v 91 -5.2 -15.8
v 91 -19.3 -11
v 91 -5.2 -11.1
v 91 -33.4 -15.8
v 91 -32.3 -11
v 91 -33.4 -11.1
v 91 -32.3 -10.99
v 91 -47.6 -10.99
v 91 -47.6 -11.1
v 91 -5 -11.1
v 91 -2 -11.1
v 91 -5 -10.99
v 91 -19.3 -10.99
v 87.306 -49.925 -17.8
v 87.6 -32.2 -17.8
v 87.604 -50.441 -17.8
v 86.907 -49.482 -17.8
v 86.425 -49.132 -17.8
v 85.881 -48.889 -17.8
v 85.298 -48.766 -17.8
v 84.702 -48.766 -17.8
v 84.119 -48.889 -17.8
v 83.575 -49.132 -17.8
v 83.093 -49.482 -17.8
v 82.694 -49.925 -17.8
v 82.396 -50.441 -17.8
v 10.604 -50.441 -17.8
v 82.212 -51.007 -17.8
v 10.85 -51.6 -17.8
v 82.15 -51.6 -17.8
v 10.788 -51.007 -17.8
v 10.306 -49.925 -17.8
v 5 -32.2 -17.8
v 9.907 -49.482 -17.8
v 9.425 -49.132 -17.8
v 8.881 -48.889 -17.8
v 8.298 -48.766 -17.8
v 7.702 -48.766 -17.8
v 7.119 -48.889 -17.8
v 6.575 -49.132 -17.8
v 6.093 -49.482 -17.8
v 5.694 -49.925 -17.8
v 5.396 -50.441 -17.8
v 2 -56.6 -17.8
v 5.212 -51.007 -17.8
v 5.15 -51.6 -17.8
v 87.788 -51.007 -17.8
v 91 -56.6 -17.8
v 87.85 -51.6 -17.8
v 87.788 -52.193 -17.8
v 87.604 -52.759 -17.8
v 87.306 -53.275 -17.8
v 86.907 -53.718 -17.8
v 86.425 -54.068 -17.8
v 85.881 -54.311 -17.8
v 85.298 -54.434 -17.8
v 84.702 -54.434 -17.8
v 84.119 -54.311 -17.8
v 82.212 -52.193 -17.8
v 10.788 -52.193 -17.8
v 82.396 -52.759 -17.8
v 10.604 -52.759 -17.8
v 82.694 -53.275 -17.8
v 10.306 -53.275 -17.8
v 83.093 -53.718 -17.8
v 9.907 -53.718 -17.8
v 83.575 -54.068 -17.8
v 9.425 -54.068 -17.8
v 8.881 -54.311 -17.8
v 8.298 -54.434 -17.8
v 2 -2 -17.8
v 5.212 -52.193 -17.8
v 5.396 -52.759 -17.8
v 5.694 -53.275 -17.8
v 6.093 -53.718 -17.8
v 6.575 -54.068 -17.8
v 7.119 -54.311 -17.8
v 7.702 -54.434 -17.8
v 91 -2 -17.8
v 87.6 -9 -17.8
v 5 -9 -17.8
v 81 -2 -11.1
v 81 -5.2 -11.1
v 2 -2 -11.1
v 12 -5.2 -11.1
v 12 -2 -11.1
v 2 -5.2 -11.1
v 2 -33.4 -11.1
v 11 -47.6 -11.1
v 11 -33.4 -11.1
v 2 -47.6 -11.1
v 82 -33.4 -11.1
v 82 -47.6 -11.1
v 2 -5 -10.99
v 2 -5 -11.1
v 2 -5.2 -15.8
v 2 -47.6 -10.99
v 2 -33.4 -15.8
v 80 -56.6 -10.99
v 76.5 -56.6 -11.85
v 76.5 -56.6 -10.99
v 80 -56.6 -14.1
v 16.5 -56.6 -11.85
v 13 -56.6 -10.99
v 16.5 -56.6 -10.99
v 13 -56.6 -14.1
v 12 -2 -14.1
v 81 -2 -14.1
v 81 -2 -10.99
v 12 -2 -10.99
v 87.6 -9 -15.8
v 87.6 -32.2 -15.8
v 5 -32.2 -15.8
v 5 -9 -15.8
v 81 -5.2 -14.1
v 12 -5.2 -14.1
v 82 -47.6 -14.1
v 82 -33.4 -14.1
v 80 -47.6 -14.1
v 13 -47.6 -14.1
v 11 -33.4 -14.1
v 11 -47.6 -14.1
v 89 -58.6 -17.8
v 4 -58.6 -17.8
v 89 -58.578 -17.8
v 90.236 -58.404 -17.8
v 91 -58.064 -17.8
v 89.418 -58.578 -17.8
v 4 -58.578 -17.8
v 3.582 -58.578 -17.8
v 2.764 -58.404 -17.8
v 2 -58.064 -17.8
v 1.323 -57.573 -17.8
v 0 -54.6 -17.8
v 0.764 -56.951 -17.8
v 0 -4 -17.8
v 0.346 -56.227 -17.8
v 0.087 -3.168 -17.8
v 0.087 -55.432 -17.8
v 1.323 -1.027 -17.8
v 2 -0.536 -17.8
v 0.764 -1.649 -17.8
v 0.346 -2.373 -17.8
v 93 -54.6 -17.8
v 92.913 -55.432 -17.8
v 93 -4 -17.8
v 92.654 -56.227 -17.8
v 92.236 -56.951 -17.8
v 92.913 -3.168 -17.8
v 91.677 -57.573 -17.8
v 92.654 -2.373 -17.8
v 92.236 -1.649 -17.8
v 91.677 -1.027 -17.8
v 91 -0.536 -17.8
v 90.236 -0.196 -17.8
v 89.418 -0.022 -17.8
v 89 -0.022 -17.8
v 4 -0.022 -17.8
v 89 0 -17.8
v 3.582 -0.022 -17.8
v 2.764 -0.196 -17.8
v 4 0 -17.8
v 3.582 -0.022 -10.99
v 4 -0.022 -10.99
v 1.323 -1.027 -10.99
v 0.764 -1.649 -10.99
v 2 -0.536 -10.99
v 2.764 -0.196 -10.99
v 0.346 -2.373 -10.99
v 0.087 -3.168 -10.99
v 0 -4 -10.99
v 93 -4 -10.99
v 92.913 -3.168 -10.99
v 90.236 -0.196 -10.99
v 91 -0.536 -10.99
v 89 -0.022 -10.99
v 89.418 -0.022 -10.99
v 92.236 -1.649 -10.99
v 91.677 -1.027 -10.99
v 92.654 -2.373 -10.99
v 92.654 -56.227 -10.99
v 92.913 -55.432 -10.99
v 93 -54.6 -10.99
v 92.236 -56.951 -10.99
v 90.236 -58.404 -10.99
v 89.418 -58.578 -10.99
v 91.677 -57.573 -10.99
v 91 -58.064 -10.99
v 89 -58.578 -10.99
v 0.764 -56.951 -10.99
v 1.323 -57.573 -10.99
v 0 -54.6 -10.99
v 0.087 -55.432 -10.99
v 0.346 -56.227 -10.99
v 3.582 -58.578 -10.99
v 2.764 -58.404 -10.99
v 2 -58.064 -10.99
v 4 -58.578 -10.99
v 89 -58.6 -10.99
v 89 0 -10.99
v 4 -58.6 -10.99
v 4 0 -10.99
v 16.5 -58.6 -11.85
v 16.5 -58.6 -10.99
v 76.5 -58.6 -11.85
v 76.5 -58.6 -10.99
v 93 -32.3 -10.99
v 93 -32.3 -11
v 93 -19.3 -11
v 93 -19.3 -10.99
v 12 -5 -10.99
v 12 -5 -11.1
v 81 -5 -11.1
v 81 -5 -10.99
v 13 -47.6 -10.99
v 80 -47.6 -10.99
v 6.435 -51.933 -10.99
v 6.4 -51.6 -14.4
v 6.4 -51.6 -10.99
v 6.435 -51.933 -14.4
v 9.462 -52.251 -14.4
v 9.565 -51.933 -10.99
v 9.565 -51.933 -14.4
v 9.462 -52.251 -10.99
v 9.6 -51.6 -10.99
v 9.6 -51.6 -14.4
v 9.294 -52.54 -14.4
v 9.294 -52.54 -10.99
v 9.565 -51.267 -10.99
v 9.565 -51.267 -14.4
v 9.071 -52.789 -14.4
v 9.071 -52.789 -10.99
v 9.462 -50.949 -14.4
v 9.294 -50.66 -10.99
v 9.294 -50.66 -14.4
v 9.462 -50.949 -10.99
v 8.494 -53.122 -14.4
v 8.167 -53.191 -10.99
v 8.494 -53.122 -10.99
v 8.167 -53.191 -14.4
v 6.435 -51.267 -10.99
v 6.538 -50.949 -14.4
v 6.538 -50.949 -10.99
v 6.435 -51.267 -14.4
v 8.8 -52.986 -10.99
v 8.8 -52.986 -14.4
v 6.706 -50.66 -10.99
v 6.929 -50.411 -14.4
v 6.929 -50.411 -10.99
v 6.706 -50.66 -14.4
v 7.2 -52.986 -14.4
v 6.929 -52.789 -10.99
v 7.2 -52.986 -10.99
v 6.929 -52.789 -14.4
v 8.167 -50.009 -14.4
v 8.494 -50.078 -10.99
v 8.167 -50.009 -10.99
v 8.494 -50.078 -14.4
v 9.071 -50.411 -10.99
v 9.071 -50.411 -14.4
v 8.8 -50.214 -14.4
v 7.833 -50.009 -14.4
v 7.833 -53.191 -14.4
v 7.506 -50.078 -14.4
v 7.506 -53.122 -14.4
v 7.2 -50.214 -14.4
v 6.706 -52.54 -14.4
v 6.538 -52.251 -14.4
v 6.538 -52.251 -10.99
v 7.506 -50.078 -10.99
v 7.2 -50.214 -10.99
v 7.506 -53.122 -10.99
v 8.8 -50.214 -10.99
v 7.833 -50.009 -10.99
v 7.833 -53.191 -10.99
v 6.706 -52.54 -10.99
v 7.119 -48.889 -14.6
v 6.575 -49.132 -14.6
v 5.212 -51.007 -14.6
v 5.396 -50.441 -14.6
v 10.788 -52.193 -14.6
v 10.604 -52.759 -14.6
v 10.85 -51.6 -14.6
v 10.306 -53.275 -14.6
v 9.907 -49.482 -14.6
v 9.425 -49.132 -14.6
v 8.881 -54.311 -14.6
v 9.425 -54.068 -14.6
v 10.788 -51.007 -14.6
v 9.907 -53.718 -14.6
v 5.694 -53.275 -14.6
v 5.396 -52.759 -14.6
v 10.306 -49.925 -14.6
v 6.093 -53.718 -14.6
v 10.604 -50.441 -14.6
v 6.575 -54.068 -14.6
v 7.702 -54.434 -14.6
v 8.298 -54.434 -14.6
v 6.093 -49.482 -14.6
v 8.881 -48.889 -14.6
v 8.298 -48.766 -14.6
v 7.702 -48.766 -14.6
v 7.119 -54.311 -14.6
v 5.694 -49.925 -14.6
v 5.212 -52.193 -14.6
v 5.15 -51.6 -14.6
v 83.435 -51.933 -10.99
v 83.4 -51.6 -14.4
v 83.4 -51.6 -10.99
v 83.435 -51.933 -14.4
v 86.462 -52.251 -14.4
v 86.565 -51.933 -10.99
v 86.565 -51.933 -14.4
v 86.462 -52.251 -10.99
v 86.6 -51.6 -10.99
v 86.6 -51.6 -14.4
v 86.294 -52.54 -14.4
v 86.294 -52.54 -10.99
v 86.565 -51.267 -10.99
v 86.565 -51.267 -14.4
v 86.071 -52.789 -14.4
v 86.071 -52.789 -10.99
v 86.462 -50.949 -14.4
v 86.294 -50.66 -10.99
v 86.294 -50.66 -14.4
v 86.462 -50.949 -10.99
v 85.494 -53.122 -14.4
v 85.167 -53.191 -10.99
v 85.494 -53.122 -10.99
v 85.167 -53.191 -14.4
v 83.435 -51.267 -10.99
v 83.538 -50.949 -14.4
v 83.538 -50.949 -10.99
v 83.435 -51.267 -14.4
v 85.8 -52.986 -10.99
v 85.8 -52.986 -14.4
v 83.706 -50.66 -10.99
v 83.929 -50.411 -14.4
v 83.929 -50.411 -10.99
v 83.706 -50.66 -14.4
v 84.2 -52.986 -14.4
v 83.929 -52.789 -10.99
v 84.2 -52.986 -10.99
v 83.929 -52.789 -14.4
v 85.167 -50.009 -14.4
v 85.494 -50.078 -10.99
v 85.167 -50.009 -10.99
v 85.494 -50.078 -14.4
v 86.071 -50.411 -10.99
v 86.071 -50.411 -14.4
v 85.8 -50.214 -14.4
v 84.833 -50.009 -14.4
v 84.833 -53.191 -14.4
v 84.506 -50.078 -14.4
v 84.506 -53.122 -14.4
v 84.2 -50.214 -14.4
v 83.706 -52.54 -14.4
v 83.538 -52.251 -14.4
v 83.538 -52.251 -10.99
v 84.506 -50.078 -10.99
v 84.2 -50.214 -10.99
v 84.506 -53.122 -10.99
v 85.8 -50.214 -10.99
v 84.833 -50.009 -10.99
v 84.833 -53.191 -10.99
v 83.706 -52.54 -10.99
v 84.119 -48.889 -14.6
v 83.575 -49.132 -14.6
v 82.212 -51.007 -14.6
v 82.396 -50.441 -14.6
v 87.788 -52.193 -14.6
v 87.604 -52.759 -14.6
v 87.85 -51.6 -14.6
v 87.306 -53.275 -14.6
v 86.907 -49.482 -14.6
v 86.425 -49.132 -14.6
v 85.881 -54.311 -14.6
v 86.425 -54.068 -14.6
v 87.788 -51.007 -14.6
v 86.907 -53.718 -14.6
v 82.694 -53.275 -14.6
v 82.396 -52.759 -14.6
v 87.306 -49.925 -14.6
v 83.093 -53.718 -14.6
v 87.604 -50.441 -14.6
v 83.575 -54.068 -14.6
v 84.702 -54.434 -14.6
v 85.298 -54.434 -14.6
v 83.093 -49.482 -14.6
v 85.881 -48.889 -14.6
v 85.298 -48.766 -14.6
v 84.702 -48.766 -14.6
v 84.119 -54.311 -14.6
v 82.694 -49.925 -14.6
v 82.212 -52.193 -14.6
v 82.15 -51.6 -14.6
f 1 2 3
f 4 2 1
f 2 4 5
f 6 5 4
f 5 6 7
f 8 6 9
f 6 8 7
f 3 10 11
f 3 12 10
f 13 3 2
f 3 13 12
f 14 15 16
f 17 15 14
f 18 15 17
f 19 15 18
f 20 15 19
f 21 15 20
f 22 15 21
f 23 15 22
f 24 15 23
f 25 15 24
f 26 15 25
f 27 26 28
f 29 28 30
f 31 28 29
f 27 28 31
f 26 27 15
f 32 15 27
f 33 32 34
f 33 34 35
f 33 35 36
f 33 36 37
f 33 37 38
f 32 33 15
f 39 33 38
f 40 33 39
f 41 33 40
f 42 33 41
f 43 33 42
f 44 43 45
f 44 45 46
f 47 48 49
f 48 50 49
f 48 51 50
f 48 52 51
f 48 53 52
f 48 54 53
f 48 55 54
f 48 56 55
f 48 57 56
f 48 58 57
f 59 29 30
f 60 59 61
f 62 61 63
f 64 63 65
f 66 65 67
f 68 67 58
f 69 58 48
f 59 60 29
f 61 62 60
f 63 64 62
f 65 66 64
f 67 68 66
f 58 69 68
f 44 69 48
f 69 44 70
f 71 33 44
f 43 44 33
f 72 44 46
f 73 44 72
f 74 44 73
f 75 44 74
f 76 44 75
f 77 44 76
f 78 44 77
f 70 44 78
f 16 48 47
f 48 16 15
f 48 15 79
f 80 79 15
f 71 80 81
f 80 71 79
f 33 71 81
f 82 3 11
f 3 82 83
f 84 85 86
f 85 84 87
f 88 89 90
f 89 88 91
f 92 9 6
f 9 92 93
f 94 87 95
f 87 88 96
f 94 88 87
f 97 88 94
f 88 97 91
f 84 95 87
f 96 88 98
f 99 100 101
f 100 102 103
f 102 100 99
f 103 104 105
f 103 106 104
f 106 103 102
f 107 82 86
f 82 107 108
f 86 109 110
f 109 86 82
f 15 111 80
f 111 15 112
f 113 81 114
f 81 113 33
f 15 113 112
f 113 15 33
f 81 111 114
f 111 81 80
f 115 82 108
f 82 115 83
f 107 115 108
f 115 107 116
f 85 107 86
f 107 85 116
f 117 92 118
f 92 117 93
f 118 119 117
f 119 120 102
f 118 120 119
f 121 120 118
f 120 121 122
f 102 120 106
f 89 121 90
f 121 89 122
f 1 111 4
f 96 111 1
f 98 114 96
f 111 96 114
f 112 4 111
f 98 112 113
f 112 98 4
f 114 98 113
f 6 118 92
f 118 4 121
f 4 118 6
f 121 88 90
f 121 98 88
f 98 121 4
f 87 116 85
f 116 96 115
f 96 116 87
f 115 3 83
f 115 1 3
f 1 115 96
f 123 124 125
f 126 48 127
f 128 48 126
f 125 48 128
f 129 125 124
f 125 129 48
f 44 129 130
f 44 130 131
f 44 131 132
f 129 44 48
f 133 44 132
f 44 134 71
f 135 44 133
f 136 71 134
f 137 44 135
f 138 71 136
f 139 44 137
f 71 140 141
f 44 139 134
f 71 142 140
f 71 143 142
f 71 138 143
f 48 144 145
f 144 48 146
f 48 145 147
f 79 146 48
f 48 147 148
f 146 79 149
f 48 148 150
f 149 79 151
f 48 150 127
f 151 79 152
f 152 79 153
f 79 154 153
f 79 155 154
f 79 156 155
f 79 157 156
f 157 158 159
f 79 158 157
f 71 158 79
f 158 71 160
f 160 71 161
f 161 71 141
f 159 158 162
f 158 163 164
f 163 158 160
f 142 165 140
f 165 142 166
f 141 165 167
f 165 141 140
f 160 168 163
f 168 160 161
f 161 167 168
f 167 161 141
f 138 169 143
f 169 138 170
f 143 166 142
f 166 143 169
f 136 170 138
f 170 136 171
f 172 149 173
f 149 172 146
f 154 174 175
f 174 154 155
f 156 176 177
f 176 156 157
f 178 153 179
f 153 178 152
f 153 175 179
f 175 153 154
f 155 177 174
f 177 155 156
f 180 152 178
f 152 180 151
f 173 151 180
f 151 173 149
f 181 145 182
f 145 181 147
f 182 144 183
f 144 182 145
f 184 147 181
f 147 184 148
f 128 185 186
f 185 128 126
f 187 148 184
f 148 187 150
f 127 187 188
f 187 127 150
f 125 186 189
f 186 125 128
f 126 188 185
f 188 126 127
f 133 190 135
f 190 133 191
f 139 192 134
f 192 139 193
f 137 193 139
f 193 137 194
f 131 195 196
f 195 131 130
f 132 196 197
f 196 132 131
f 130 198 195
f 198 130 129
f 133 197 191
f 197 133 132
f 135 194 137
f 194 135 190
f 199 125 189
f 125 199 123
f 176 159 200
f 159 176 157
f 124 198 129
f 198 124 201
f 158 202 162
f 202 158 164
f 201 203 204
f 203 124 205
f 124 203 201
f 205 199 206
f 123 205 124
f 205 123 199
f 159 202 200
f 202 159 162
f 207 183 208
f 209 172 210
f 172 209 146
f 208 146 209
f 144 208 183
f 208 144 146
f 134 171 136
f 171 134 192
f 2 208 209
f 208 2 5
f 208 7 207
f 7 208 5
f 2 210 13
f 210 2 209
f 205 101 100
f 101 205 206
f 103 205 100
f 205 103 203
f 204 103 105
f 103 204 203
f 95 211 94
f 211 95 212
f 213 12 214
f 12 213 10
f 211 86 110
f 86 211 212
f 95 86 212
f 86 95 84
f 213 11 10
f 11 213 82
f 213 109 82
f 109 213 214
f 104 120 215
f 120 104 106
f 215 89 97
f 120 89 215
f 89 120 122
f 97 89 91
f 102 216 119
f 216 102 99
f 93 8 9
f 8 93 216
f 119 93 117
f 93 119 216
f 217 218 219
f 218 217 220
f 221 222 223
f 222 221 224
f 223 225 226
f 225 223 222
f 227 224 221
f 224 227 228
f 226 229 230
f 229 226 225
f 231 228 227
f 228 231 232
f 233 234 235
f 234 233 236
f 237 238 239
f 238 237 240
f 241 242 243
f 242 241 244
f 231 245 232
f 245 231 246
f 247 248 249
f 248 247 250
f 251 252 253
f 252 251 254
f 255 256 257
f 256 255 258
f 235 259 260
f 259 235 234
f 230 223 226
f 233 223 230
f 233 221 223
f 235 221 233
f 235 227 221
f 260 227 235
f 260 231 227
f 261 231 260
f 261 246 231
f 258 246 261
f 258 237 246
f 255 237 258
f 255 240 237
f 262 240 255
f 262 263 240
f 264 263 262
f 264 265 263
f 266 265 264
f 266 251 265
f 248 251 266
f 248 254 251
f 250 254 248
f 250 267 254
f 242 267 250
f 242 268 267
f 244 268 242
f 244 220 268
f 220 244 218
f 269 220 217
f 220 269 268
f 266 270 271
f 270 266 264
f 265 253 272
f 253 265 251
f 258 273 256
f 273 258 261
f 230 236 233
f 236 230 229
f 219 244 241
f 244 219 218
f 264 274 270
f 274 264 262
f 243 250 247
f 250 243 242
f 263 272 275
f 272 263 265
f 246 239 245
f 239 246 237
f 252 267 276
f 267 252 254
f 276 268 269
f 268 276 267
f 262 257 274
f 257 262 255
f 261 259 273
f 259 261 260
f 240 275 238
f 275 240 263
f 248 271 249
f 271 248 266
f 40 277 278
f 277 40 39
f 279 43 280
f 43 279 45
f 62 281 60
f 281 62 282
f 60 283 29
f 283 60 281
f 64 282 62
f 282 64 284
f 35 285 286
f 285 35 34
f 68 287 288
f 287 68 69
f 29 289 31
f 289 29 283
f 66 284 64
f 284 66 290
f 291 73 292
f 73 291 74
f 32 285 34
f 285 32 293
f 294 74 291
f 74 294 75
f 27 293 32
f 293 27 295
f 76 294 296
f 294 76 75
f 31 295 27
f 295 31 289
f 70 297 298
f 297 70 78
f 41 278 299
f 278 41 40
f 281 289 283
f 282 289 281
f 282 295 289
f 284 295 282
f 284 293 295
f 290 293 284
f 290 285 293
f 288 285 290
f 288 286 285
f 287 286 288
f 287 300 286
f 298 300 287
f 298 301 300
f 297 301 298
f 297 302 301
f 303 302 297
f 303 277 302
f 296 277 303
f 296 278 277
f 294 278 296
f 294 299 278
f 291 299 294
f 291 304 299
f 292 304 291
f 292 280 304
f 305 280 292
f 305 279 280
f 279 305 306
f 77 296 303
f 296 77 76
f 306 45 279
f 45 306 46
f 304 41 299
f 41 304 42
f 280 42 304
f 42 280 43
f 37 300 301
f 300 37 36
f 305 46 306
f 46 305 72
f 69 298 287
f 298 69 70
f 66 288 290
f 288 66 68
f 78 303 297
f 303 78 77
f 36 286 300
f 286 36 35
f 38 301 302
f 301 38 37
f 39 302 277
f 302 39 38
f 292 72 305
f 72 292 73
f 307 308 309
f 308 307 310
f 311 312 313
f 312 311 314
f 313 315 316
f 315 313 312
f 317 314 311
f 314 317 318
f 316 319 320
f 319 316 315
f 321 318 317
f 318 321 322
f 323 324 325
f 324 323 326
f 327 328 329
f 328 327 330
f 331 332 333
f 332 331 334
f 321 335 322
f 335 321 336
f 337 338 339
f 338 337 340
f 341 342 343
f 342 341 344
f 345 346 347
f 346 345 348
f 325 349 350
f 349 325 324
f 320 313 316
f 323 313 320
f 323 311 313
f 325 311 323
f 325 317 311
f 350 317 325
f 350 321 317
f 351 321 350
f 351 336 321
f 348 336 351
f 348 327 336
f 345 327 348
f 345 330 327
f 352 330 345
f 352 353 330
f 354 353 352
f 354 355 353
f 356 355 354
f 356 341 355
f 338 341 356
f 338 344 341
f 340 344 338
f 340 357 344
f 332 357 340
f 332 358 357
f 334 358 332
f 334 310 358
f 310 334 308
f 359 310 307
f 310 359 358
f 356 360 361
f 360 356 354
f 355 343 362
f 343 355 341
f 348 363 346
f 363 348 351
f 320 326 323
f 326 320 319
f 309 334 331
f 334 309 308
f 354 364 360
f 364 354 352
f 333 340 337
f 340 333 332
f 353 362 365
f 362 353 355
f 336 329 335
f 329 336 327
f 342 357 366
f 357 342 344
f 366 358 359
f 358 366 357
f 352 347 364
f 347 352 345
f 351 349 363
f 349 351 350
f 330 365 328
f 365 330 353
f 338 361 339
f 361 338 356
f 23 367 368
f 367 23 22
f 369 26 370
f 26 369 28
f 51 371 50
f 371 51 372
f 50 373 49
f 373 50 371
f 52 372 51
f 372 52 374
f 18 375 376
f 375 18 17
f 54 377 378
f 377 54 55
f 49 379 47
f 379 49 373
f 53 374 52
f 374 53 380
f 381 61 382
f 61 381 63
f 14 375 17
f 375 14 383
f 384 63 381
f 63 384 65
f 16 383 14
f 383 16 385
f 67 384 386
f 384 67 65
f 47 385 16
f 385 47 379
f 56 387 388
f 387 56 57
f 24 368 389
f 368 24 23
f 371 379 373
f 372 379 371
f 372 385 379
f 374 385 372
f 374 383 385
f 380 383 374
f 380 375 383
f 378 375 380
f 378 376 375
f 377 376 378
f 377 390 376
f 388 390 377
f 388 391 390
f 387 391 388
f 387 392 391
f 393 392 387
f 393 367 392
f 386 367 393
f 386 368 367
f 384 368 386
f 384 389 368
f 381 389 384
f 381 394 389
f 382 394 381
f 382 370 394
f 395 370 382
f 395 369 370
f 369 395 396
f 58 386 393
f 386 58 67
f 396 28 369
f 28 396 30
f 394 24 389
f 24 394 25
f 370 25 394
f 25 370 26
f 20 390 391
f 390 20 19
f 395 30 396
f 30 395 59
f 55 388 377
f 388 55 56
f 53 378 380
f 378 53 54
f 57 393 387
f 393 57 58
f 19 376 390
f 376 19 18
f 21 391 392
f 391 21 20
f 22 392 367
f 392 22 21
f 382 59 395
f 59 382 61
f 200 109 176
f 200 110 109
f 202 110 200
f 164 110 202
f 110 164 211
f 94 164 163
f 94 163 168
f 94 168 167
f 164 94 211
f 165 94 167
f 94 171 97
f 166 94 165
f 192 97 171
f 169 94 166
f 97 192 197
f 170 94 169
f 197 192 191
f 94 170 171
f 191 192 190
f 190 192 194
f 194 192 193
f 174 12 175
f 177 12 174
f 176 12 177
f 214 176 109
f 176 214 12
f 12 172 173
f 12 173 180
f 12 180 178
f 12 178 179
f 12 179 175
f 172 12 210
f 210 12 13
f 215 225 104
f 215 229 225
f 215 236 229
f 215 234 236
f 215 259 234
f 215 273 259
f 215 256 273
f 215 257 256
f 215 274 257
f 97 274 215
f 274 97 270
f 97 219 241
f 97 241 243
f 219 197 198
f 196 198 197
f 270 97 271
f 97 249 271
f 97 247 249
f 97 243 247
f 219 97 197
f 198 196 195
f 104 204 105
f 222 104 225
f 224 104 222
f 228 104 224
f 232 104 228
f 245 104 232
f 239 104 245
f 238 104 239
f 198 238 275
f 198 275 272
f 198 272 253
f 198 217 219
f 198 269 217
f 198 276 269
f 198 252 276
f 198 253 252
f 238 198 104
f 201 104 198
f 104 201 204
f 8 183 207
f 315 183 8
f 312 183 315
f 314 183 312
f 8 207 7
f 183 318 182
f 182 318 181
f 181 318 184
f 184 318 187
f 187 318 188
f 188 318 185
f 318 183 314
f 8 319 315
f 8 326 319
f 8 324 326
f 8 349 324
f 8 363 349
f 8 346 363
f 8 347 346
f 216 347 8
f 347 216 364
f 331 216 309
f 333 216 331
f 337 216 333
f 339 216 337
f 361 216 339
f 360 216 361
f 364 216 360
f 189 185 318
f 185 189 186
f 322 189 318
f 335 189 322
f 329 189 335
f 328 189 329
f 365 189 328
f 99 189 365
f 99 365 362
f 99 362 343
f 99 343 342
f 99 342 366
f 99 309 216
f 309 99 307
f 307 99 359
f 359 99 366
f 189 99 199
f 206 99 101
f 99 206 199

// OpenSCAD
// case for mooltipass prototype
// v1
//
// Author: Darran Hunt


m3_diameter	= 3.2;
m3_nut_diameter = 5.5/cos(30)+0.4;
m3_nut_height   = 3.0;
m3_cap_diameter	= 5.7;
m3_cap_height	= 3.2;

radius = 10.2/2;
bevel = 12.2/2;

pcb_len = 88.6;
pcb_width = 41.2;
pcb_thickness = 2.1;
pcb_component_height = 3.0;
card_slot_height = 6.5;
card_slot_length = 60.0;

oled_width = 28.2;
oled_length = 88.6;
oled_offset = 1.5;
oled_thickness = 2.2;
oled_flex_clearance = 3.0;

usb_width = 13.0;
usb_height = 9.0; // 6.5mm above PCB

isp_len = 12.6;
isp_width = 7.5;
isp_xoff = 13.0;
isp_yoff = 5.0;

support_width = 5.0;
support_len = 5.0;

wall = 2.2;
cover = 2;
length = pcb_len + wall*2;
width = pcb_width + oled_flex_clearance + 2*wall+10;
height = card_slot_height+pcb_thickness+pcb_component_height+oled_thickness+2*cover;

oled_height =  cover+card_slot_height+pcb_thickness+pcb_component_height;

top_height = cover+card_slot_height+pcb_thickness+pcb_component_height+oled_thickness;
top_thickness = 6.7; // height-top_height;

case(top=true, bottom=false);

module case(top, bottom)
{

    rotate([top && !bottom ? 180:0,0,0])
    difference() {
	union() {
	    top();
	    bottom();

	    // screw blocks
	    translate([2, width-11, cover]) cube([11,9,height-cover*2]);
	    translate([length-11-2, width-11, cover]) cube([11,9,height-cover*2]);

	}

	// screw holes
	translate([8, width-7, -0.01]) {
	    cylinder(r=m3_nut_diameter/2, h=m3_nut_height, $fn=6);
	    translate([0, 0, 0.01+m3_nut_height+0.3])
		cylinder(r=m3_diameter/2, h=height-m3_cap_height-m3_nut_height-0.5, $fn=30);
	    translate([0, 0, 0.01+height-m3_cap_height])
		cylinder(r=m3_cap_diameter/2, h=m3_cap_height+0.01, $fn=30);
	}
	translate([length-8, width-7, -0.01]) {
	    cylinder(r=m3_nut_diameter/2, h=m3_nut_height, $fn=6);
	    #translate([0, 0, 0.01+m3_nut_height+0.3])
		cylinder(r=m3_diameter/2, h=height-m3_cap_height-m3_nut_height-0.5, $fn=30);
	    translate([0, 0, 0.01+height-m3_cap_height])
		cylinder(r=m3_cap_diameter/2, h=m3_cap_height+0.01, $fn=30);
	}


	// remove bottom
	if (!bottom) {
	    translate([-0.01,-0.01,-0.01]) cube([length+0.02,width+0.02,11]);
	}

	// remove top
	if (!top) {
	    translate([-0.01,-0.01,11-0.01]) cube([length+0.02,width+0.02,11]);
	}
    }
}

// PCB
*#translate([wall,wall+oled_flex_clearance,cover+pcb_component_height])
    cube([pcb_len, pcb_width, pcb_thickness]);

// PCB centre line
*%translate([wall,wall+oled_flex_clearance+pcb_width/2-1,cover+pcb_component_height])
    cube([pcb_len, 2, pcb_thickness*2]);


*difference() {
    translate([2, 2, height-top_thickness]) 
	top();

    // oled panel cutout
    translate([wall-0.5, wall+oled_flex_clearance, cover+card_slot_height+pcb_thickness+pcb_component_height-4])
	cube([oled_length+1, oled_width, oled_thickness+4]);
}


// oled
*%translate([wall, wall+oled_flex_clearance, cover+card_slot_height+pcb_thickness+pcb_component_height])
    cube([oled_length, oled_width, oled_thickness]);

module top() 
{
    difference() {
	translate([2, 2, height-top_thickness]) 
	    difference() {
		cube([length-4, width-4, top_thickness]);
		//rounded_box(length-4, width-4, height-top_height, 2);
		// oled cutout
		translate([3, oled_flex_clearance+4, -0.02])
		    cube([oled_length-6, oled_width-5, top_thickness+0.04]);
		// support cutouts
		translate([10, -1, -4]) 
		    cube([length - 4 - 2*10, 9, 7]);
		translate([9, width-28, -4]) 
		    cube([length - 4 - 2*9, 25, 7]);

		// oled screen
		*#translate([0,oled_flex_clearance, height - oled_height - top_thickness])
		    cube([oled_length, oled_width, oled_thickness]);

	    }
	translate([wall-0.5, wall+oled_flex_clearance, cover+card_slot_height+pcb_thickness+pcb_component_height-4])
	    cube([oled_length+1, oled_width, oled_thickness+4]);
    }

    // connector inserts
}

module bottom() {
    difference() {
	rounded_box(length, width, height, 4);
	translate([2,2,2])
	cube([length-4, width-4, height]);
	//rounded_box(length-4, width-4, height, 2);

	translate([0,oled_flex_clearance,0]) {
	    translate([length, wall+pcb_width/2, cover])
		usb();

	    // ISP access
	    translate([length-wall-isp_xoff, wall+isp_yoff,-1])
		cube([isp_len, isp_width+1, 4]);

	    // pcb cavity
	    translate([wall,wall,cover])
		cube([pcb_len, pcb_width, height-cover*2]);
	}

	//card_slot_height = 6.5;
	//card_slot_length = 63.0;
	// card slot
	translate([length/2,width-wall+1,cover+pcb_component_height+pcb_thickness+card_slot_height/2])
	    cube([card_slot_length, 4, 3], center=true);
    }

    // card support
    #translate([length/2-card_slot_length/2, 0.2+wall+oled_flex_clearance+pcb_width, cover])
        cube([card_slot_length, 0.1+width-pcb_width-oled_flex_clearance-wall*2, pcb_component_height+pcb_thickness+card_slot_height/2-1.5]);

    // pcb supports
    translate([0,oled_flex_clearance,0]) 
	for (i = [[0,0,0], [0,1,0], [1,1,0], [1,0,0]]) {
	    translate([2,2,cover] + [i[0]*(pcb_len-support_len+(wall-2)*2), i[1]*(pcb_width-support_width+(wall-2)*2), 0])
		cube([support_len, support_width, pcb_component_height]);
	}
    translate([2,2,cover])
        cube([10,oled_flex_clearance,pcb_component_height+pcb_thickness+4]);
    translate([length-2-10,2,cover])
        cube([10,oled_flex_clearance,pcb_component_height+pcb_thickness+4]);
    
}

module usb() 
{
    translate([-5,-usb_width/2,0])
	cube([6, usb_width, usb_height]);
}


module rounded_box(width, length, height, radius)
{
    union() {
        translate([radius,0,0])
	    cube([width-radius*2,length,height]);
        translate([0,radius,0])
	    cube([width,length-radius*2,height]);

	// rounded corners
	for (i = [[radius, radius, 0],
		  [width-radius, radius, 0],
		  [width-radius, length-radius, 0],
		  [radius, length-radius, 0]]) {
            translate(i) cylinder(h=height, r=radius, $fn=30);
	 }
    }
}
